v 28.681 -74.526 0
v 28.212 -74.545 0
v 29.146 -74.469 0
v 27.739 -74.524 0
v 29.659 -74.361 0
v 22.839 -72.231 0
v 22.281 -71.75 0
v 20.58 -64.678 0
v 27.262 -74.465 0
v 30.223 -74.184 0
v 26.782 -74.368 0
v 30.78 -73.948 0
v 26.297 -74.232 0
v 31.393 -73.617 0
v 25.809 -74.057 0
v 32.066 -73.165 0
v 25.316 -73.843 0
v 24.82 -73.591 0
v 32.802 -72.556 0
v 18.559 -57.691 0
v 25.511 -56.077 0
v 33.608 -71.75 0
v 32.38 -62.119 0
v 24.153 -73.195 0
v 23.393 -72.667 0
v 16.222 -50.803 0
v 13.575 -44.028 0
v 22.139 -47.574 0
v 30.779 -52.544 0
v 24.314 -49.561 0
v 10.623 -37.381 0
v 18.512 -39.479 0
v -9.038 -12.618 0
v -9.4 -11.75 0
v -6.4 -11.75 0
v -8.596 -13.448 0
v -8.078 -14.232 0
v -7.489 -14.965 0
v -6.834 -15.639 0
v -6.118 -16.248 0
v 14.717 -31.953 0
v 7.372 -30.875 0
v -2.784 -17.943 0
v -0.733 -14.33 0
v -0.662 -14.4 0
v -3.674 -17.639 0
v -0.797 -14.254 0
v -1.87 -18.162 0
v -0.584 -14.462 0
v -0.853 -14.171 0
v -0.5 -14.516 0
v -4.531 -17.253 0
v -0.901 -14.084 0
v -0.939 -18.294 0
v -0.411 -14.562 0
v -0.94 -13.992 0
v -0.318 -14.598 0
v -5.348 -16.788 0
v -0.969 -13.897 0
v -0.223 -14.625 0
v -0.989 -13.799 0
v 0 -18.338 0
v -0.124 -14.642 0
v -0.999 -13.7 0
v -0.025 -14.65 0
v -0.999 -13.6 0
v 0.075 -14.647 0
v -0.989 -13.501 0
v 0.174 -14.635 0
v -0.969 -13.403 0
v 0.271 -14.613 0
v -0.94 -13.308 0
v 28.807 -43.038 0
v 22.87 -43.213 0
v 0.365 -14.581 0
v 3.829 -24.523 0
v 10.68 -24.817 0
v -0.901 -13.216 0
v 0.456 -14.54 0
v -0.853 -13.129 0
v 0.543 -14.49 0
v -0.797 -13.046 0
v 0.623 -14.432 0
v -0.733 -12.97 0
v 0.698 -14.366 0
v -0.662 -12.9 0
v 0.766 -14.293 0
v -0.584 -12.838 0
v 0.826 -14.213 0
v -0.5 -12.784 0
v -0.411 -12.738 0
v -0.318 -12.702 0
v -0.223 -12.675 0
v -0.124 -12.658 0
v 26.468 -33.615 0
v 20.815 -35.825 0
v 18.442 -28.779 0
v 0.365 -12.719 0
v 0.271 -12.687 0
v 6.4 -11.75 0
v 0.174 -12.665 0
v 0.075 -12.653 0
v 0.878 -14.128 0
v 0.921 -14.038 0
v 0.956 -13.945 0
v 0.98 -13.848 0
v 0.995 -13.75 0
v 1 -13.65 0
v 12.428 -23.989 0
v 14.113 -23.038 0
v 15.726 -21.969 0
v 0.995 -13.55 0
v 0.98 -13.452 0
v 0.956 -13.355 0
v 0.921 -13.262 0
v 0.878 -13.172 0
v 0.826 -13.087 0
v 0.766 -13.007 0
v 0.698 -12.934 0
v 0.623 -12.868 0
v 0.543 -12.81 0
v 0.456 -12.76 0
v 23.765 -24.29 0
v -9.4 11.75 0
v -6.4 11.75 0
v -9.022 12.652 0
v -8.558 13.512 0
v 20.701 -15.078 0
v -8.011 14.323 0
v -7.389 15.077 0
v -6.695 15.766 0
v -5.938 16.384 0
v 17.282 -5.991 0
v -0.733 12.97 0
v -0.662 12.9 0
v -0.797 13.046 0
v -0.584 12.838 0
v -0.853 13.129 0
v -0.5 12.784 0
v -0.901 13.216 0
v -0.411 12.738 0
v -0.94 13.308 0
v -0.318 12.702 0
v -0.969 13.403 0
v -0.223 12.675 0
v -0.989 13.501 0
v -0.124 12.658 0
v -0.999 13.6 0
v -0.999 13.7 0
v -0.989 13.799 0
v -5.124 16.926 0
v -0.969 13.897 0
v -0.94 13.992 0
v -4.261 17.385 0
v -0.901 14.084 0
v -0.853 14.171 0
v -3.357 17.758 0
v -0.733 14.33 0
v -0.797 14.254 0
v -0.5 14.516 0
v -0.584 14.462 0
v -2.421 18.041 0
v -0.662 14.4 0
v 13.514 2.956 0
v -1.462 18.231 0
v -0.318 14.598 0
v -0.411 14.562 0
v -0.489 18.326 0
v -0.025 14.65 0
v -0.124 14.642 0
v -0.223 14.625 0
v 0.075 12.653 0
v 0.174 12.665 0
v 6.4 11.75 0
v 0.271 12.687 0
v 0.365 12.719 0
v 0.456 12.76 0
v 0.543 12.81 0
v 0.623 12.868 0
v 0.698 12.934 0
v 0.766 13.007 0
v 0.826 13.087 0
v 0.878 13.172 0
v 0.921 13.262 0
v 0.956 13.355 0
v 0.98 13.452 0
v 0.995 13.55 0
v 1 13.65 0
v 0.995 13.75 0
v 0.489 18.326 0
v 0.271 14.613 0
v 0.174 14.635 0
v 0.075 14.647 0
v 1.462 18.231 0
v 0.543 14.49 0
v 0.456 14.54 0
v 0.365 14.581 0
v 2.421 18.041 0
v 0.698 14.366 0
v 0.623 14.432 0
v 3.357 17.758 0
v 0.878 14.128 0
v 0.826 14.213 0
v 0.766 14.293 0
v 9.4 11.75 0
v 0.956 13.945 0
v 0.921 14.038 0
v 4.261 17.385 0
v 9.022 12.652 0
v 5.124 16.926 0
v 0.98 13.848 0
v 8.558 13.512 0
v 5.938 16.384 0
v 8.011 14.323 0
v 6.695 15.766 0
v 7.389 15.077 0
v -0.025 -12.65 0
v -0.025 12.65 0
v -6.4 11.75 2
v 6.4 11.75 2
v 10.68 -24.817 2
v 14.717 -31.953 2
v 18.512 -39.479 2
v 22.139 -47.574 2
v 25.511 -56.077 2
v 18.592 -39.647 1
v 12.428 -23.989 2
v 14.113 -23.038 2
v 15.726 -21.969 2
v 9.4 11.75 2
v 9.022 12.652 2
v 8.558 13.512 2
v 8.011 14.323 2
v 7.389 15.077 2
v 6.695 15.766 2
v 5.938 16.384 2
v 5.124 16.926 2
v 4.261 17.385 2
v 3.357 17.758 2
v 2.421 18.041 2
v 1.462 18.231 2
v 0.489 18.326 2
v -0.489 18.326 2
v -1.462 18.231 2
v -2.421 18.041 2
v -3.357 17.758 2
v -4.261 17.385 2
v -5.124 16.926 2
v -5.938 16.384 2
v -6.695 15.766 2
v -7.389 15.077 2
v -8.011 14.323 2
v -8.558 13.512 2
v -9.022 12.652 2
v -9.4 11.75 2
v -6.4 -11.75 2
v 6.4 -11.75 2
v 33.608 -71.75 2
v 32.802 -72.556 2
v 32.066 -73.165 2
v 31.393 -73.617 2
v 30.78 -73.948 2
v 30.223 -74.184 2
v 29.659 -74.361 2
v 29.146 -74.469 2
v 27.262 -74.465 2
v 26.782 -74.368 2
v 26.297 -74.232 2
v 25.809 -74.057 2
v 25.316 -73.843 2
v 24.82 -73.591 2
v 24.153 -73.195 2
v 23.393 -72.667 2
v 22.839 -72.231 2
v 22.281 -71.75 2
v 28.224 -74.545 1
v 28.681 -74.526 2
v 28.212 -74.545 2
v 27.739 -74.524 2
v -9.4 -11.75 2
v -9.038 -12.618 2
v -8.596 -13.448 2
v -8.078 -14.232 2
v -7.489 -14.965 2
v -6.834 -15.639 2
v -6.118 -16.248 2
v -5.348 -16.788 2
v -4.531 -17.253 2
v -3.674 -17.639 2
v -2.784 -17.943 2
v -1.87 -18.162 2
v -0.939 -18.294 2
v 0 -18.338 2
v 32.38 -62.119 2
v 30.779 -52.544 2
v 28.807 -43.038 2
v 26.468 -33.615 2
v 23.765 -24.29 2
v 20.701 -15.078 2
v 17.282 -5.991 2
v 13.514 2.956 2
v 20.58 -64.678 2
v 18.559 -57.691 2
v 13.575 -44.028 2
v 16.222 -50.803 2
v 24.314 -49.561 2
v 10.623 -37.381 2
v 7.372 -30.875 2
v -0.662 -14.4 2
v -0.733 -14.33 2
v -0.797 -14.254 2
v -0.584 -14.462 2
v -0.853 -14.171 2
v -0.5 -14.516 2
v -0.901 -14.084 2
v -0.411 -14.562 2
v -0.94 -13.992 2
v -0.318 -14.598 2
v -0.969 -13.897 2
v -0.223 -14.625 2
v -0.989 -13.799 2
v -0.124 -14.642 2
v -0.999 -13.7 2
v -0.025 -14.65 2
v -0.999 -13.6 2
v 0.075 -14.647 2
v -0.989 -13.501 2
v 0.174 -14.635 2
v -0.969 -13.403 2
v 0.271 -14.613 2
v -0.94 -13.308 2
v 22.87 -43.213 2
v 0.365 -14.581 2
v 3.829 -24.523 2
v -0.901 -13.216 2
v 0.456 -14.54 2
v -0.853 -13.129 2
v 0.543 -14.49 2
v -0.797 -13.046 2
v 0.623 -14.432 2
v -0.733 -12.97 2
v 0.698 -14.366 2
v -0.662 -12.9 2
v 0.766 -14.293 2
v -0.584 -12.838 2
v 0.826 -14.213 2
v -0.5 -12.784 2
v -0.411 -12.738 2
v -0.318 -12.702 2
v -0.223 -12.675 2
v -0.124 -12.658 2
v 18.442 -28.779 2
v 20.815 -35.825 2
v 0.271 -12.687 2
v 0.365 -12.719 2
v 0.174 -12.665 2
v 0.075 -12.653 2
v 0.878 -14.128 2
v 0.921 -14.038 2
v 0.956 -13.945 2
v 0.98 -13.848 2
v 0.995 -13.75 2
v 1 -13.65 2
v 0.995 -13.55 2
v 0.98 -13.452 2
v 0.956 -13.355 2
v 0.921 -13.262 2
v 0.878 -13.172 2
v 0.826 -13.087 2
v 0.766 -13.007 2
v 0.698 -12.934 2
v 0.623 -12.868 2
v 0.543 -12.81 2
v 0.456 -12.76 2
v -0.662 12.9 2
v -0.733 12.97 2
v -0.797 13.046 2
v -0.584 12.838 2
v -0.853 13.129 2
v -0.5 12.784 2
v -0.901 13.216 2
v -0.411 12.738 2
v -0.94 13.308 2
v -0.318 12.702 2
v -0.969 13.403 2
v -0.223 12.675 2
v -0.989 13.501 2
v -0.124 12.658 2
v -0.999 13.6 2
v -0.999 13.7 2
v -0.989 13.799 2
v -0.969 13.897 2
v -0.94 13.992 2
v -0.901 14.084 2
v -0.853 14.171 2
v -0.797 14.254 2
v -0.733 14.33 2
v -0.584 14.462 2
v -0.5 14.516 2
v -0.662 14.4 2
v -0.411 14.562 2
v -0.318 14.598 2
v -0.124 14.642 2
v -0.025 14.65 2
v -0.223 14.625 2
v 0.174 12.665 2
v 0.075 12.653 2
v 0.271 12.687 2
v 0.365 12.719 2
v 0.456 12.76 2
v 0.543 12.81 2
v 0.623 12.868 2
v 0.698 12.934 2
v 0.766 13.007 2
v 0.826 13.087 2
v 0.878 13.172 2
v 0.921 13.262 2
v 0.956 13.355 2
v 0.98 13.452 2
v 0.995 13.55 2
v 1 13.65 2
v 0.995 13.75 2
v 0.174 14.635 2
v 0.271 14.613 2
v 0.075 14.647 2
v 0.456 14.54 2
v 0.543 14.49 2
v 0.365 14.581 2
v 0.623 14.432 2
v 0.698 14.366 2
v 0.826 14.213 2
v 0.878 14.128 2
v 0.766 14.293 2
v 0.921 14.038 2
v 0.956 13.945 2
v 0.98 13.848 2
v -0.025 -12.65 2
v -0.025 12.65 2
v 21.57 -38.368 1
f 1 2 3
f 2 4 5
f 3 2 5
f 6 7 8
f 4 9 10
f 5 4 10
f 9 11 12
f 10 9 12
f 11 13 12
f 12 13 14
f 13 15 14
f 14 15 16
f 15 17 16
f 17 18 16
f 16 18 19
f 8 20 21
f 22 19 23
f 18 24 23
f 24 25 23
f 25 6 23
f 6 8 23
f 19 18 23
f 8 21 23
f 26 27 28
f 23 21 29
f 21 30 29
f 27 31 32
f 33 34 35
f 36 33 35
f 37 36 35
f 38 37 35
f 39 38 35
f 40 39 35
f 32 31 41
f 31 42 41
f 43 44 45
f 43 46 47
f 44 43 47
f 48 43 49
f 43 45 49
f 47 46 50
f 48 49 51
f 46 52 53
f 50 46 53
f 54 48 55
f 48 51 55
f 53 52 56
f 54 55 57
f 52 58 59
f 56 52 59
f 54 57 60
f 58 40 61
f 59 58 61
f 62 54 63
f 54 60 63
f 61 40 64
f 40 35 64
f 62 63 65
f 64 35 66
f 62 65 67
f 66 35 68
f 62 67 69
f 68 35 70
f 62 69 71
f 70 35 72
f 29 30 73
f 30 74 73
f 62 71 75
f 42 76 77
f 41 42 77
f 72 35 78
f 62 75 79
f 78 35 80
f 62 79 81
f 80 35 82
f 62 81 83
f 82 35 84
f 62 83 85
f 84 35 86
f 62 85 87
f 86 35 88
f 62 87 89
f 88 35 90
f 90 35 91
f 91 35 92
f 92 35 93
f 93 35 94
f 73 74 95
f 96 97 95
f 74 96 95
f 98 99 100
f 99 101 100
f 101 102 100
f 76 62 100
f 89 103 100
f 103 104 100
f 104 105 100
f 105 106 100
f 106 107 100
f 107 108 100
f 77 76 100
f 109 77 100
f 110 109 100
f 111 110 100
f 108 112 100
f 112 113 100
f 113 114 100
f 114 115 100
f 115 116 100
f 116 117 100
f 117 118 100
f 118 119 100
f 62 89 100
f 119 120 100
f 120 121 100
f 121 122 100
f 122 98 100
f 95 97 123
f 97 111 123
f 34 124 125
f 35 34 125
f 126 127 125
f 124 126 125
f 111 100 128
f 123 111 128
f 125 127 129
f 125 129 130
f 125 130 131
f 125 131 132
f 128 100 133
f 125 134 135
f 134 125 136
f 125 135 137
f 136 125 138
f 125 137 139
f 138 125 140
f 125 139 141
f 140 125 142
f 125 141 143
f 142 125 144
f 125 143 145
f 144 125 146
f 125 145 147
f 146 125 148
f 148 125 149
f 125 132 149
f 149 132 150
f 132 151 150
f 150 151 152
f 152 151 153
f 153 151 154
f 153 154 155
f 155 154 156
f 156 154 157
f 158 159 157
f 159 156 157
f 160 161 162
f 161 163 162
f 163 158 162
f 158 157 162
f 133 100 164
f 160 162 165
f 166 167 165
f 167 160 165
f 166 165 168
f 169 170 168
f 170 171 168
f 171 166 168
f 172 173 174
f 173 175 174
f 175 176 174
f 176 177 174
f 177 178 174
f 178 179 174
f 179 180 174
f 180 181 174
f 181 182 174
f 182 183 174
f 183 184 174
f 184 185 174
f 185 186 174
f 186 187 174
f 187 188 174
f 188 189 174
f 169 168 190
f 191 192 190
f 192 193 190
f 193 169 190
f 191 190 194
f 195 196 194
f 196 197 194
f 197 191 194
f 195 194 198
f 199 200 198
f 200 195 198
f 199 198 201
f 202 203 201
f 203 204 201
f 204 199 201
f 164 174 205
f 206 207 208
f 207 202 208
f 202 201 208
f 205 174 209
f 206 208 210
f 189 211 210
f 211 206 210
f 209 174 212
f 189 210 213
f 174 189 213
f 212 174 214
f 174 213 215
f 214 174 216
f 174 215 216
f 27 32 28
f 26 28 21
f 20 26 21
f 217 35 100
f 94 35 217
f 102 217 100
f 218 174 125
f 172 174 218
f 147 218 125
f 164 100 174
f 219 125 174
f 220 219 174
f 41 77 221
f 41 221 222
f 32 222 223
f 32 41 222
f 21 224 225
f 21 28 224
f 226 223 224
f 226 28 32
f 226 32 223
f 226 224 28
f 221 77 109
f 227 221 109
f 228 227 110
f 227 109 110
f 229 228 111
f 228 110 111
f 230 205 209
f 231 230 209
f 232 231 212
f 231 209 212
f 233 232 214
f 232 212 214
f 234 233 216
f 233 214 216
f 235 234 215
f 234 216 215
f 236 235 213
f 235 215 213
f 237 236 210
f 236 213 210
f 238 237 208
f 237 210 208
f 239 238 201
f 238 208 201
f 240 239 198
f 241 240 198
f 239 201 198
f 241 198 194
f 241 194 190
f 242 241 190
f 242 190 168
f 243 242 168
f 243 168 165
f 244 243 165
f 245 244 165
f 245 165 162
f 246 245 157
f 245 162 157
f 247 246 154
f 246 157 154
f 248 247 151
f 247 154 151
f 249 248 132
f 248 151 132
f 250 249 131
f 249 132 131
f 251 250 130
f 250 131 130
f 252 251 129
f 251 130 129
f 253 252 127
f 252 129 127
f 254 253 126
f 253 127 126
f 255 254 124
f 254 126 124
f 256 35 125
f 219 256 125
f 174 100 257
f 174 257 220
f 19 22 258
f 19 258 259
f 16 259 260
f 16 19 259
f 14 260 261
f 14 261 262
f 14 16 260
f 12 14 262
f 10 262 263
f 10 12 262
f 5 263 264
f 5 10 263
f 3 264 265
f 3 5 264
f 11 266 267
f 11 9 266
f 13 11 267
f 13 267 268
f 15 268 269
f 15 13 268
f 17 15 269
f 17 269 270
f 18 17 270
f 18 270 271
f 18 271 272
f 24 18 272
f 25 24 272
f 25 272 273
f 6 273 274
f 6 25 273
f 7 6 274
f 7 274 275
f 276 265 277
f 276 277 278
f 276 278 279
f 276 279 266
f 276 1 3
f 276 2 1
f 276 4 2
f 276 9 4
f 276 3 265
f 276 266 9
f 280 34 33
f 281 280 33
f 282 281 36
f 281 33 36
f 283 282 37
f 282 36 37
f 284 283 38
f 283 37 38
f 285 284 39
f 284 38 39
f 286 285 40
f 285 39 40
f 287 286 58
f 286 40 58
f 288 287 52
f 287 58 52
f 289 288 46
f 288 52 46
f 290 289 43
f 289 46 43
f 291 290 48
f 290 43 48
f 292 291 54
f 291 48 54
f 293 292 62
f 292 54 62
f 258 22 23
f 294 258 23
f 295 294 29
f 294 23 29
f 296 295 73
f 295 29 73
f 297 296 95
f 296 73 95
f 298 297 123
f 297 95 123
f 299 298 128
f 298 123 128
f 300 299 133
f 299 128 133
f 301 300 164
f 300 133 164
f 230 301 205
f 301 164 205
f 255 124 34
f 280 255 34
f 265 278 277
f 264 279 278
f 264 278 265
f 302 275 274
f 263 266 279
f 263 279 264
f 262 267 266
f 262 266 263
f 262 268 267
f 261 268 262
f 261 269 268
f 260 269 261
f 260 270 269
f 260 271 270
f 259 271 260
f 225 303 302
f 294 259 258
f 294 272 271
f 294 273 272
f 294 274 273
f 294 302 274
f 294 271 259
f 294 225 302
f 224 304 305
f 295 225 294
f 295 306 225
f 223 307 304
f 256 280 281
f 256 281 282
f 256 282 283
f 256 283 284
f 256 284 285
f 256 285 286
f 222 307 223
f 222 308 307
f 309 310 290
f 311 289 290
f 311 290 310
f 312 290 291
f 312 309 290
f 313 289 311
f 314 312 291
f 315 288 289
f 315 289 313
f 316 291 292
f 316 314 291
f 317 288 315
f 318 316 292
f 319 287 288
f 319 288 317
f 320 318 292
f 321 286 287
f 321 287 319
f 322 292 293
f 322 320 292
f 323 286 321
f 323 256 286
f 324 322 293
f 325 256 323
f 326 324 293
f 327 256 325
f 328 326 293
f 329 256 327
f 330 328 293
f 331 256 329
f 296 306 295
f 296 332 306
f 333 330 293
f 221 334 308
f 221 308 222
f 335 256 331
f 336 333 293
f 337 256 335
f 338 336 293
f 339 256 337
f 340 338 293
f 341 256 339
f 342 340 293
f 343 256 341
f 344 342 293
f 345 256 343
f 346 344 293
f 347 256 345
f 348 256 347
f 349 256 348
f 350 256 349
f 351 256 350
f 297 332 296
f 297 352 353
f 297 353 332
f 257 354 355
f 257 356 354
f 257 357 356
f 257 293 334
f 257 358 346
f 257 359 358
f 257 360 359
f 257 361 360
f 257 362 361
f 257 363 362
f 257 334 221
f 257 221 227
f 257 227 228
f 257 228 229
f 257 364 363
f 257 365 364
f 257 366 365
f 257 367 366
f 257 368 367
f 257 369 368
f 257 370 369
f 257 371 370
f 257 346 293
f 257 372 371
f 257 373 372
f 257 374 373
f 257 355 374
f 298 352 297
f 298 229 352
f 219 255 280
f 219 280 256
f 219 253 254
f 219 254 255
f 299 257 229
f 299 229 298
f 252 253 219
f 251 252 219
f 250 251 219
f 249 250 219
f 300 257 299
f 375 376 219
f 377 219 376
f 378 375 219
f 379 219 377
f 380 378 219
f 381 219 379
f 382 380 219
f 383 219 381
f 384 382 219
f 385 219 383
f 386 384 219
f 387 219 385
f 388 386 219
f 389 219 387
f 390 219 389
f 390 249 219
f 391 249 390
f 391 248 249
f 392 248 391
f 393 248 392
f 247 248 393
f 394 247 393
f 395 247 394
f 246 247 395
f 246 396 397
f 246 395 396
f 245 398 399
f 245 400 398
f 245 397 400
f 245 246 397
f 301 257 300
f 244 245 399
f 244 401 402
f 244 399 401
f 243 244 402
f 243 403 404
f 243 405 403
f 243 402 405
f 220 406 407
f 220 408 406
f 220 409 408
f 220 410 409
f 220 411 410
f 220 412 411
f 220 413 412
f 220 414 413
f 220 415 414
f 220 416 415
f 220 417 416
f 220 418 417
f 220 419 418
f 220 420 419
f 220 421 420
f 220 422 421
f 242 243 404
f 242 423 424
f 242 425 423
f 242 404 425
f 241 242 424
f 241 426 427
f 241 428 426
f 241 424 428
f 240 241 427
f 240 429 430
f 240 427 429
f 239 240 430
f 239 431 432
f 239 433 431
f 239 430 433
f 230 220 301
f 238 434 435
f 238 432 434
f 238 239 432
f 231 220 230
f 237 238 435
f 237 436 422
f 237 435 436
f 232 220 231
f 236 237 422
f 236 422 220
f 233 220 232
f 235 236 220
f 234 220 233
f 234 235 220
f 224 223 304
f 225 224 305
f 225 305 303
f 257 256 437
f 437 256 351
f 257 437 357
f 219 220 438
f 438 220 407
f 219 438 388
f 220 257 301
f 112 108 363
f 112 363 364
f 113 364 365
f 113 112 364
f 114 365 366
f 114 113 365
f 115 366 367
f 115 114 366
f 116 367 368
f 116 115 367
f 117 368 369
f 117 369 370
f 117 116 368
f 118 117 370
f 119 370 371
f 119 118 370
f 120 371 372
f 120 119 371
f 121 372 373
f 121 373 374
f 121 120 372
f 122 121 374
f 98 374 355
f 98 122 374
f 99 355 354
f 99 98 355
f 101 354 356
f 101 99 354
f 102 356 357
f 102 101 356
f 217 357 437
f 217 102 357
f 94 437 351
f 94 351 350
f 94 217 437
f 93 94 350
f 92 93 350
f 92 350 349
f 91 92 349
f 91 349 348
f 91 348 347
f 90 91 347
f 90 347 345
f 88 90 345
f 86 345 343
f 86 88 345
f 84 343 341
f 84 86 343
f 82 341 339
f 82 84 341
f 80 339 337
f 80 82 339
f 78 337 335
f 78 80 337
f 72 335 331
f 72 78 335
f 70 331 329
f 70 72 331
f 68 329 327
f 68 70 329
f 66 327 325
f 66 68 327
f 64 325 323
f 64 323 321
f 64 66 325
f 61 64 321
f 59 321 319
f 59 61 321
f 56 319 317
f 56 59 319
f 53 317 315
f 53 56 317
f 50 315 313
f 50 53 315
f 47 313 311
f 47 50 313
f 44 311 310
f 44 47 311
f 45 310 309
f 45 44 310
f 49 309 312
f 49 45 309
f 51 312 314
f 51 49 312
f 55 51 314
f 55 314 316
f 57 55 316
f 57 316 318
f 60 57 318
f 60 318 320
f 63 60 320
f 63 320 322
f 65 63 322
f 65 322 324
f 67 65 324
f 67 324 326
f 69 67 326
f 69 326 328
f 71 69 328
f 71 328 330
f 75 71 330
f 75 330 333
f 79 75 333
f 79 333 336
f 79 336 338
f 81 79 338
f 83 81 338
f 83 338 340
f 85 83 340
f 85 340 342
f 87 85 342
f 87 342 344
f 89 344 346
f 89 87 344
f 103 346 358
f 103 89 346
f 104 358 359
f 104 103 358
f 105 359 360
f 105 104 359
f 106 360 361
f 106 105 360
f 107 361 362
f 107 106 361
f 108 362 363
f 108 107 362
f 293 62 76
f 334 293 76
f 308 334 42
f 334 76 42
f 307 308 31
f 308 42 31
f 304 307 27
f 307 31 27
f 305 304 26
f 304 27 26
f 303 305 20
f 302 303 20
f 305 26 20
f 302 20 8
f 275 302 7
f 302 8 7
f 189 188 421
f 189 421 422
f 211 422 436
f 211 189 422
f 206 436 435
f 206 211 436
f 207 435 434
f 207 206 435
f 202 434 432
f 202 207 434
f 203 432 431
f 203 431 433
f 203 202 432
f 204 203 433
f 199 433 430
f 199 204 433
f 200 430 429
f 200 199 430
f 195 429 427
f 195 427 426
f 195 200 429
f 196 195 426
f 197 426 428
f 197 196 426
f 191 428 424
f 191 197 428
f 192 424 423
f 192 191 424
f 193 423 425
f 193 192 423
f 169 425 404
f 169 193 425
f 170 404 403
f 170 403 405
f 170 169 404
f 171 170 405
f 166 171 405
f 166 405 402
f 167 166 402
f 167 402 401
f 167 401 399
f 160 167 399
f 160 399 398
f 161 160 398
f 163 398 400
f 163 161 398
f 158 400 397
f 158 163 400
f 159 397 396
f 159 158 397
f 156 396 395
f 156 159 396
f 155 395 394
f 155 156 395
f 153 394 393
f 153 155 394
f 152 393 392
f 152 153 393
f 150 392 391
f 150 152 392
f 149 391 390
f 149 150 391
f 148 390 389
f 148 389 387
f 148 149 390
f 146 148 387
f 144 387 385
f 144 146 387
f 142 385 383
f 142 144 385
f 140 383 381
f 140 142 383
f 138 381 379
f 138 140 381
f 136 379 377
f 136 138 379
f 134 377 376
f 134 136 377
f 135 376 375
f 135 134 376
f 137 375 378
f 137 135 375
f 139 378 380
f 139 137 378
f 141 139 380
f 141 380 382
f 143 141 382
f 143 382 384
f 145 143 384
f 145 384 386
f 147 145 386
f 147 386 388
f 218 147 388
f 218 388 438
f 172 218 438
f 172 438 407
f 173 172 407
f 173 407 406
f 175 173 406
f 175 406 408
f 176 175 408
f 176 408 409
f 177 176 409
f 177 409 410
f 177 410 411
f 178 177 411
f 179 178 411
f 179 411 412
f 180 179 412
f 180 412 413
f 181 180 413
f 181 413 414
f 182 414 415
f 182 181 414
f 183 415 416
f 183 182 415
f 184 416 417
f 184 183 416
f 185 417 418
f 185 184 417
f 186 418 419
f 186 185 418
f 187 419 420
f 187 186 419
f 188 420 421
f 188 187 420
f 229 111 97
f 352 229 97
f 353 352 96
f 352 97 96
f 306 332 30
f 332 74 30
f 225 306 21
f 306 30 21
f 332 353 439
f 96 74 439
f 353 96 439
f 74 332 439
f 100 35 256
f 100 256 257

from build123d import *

# Parameters (mm, degrees)
SKETCH1_R           = 1
SKETCH1_W           = 12.8
SKETCH1_H           = 23.5
BOSS_EXTRUDE1_DEPTH = 2


with BuildPart() as part:
    # Sketch1 → Boss-Extrude1 (new body)
    with BuildSketch(Plane.XY):
        with BuildLine():
            Line((-9.4, 11.75), (-9.4, -11.75))
            ThreePointArc((-9.4, -11.75), (-5.739449267, -16.527194588), (0, -18.338255578))
            ThreePointArc((0, -18.338255578), (13.57537109, -44.028371556), (22.280776055, -71.75))
            add(Edge.make_bspline(
                [(33.607962355, -71.75), (28.503418884, -77.33913538), (22.280776055, -71.75)],
                knots=[0, 0, 0, 1, 1, 1], degree=2))
            ThreePointArc((33.607962355, -71.75), (25.161513792, -28.93962381), (9.4, 11.75))
            ThreePointArc((9.4, 11.75), (0, 18.338255578), (-9.4, 11.75))
        make_face()
        with Locations((0, -13.65)):
            Circle(SKETCH1_R, mode=Mode.SUBTRACT)
        Rectangle(SKETCH1_W, SKETCH1_H, mode=Mode.SUBTRACT)
        with Locations((0, 13.65)):
            Circle(SKETCH1_R, mode=Mode.SUBTRACT)
        with BuildLine():
            add(Edge.make_bspline(
                [(15.725665239, -21.969234099), (22.521602369, -37.712210356), (25.511369443, -56.077189315)],
                knots=[0, 0, 0, 1, 1, 1], degree=2))
            add(Edge.make_bspline(
                [(10.679903774, -24.816999203), (19.088197707, -38.847286621), (25.511369443, -56.077189315)],
                knots=[0, 0, 0, 1, 1, 1], degree=2))
            ThreePointArc((10.679903774, -24.816999203), (13.279343366, -23.528766092), (15.725665239, -21.969234099))
        make_face(mode=Mode.SUBTRACT)
    extrude(amount=BOSS_EXTRUDE1_DEPTH)


solid = part.part
